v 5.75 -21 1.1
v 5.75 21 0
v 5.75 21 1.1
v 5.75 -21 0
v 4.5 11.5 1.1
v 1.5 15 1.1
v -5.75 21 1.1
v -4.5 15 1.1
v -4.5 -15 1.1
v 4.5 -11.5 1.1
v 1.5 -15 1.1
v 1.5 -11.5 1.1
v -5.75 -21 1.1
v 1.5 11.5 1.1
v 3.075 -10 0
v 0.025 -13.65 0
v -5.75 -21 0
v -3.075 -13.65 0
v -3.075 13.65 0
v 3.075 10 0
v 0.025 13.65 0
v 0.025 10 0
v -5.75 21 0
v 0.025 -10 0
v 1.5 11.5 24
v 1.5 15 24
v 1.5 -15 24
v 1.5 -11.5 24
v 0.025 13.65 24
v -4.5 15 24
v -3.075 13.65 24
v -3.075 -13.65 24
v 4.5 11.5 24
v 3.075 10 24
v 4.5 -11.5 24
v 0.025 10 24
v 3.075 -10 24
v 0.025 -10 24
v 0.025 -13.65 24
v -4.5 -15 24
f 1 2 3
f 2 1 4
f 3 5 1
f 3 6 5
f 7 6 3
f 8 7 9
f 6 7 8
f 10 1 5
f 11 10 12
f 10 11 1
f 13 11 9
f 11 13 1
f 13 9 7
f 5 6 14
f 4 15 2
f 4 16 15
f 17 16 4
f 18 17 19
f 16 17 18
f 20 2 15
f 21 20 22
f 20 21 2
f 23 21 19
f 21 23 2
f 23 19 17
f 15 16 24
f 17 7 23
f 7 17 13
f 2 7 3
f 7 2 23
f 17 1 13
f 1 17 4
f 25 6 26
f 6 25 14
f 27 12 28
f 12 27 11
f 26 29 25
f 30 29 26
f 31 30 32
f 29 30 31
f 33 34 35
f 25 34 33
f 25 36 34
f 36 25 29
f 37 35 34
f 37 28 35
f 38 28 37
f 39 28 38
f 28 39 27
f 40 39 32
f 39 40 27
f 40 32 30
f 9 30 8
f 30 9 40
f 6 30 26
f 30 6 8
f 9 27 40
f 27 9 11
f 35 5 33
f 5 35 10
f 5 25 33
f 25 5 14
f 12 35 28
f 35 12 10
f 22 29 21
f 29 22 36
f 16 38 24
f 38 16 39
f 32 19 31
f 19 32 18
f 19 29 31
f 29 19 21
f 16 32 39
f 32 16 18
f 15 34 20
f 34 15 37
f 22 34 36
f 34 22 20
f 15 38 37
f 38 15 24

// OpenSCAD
size = [11.5, 42];

h = 24;
wide = [6, 30, h];
narrow = [3, 23, h];
widehole = [3.1, 27.3, h];
narrowhole = [3.05, 20, h];

difference() {
    union() {
        translate([-size.x / 2, -size.y / 2, 0])
            cube([size.x, size.y, 1.1]);

        translate([-narrow.x / 2, 0, 0])
        translate([-wide.x / 2, -wide.y / 2, 0])
            cube(wide);

        translate([wide.x / 2, 0, 0])
        translate([-narrow.x / 2, -narrow.y / 2, 0])
            cube(narrow);
    }

    translate([-narrowhole.x / 2, 0, 0])
    translate([-widehole.x / 2, -widehole.y / 2, 0])
        cube(widehole);
    
    translate([widehole.x / 2, 0, 0])
    translate([-narrowhole.x / 2, -narrowhole.y / 2, 0])
        cube(narrowhole);
}
